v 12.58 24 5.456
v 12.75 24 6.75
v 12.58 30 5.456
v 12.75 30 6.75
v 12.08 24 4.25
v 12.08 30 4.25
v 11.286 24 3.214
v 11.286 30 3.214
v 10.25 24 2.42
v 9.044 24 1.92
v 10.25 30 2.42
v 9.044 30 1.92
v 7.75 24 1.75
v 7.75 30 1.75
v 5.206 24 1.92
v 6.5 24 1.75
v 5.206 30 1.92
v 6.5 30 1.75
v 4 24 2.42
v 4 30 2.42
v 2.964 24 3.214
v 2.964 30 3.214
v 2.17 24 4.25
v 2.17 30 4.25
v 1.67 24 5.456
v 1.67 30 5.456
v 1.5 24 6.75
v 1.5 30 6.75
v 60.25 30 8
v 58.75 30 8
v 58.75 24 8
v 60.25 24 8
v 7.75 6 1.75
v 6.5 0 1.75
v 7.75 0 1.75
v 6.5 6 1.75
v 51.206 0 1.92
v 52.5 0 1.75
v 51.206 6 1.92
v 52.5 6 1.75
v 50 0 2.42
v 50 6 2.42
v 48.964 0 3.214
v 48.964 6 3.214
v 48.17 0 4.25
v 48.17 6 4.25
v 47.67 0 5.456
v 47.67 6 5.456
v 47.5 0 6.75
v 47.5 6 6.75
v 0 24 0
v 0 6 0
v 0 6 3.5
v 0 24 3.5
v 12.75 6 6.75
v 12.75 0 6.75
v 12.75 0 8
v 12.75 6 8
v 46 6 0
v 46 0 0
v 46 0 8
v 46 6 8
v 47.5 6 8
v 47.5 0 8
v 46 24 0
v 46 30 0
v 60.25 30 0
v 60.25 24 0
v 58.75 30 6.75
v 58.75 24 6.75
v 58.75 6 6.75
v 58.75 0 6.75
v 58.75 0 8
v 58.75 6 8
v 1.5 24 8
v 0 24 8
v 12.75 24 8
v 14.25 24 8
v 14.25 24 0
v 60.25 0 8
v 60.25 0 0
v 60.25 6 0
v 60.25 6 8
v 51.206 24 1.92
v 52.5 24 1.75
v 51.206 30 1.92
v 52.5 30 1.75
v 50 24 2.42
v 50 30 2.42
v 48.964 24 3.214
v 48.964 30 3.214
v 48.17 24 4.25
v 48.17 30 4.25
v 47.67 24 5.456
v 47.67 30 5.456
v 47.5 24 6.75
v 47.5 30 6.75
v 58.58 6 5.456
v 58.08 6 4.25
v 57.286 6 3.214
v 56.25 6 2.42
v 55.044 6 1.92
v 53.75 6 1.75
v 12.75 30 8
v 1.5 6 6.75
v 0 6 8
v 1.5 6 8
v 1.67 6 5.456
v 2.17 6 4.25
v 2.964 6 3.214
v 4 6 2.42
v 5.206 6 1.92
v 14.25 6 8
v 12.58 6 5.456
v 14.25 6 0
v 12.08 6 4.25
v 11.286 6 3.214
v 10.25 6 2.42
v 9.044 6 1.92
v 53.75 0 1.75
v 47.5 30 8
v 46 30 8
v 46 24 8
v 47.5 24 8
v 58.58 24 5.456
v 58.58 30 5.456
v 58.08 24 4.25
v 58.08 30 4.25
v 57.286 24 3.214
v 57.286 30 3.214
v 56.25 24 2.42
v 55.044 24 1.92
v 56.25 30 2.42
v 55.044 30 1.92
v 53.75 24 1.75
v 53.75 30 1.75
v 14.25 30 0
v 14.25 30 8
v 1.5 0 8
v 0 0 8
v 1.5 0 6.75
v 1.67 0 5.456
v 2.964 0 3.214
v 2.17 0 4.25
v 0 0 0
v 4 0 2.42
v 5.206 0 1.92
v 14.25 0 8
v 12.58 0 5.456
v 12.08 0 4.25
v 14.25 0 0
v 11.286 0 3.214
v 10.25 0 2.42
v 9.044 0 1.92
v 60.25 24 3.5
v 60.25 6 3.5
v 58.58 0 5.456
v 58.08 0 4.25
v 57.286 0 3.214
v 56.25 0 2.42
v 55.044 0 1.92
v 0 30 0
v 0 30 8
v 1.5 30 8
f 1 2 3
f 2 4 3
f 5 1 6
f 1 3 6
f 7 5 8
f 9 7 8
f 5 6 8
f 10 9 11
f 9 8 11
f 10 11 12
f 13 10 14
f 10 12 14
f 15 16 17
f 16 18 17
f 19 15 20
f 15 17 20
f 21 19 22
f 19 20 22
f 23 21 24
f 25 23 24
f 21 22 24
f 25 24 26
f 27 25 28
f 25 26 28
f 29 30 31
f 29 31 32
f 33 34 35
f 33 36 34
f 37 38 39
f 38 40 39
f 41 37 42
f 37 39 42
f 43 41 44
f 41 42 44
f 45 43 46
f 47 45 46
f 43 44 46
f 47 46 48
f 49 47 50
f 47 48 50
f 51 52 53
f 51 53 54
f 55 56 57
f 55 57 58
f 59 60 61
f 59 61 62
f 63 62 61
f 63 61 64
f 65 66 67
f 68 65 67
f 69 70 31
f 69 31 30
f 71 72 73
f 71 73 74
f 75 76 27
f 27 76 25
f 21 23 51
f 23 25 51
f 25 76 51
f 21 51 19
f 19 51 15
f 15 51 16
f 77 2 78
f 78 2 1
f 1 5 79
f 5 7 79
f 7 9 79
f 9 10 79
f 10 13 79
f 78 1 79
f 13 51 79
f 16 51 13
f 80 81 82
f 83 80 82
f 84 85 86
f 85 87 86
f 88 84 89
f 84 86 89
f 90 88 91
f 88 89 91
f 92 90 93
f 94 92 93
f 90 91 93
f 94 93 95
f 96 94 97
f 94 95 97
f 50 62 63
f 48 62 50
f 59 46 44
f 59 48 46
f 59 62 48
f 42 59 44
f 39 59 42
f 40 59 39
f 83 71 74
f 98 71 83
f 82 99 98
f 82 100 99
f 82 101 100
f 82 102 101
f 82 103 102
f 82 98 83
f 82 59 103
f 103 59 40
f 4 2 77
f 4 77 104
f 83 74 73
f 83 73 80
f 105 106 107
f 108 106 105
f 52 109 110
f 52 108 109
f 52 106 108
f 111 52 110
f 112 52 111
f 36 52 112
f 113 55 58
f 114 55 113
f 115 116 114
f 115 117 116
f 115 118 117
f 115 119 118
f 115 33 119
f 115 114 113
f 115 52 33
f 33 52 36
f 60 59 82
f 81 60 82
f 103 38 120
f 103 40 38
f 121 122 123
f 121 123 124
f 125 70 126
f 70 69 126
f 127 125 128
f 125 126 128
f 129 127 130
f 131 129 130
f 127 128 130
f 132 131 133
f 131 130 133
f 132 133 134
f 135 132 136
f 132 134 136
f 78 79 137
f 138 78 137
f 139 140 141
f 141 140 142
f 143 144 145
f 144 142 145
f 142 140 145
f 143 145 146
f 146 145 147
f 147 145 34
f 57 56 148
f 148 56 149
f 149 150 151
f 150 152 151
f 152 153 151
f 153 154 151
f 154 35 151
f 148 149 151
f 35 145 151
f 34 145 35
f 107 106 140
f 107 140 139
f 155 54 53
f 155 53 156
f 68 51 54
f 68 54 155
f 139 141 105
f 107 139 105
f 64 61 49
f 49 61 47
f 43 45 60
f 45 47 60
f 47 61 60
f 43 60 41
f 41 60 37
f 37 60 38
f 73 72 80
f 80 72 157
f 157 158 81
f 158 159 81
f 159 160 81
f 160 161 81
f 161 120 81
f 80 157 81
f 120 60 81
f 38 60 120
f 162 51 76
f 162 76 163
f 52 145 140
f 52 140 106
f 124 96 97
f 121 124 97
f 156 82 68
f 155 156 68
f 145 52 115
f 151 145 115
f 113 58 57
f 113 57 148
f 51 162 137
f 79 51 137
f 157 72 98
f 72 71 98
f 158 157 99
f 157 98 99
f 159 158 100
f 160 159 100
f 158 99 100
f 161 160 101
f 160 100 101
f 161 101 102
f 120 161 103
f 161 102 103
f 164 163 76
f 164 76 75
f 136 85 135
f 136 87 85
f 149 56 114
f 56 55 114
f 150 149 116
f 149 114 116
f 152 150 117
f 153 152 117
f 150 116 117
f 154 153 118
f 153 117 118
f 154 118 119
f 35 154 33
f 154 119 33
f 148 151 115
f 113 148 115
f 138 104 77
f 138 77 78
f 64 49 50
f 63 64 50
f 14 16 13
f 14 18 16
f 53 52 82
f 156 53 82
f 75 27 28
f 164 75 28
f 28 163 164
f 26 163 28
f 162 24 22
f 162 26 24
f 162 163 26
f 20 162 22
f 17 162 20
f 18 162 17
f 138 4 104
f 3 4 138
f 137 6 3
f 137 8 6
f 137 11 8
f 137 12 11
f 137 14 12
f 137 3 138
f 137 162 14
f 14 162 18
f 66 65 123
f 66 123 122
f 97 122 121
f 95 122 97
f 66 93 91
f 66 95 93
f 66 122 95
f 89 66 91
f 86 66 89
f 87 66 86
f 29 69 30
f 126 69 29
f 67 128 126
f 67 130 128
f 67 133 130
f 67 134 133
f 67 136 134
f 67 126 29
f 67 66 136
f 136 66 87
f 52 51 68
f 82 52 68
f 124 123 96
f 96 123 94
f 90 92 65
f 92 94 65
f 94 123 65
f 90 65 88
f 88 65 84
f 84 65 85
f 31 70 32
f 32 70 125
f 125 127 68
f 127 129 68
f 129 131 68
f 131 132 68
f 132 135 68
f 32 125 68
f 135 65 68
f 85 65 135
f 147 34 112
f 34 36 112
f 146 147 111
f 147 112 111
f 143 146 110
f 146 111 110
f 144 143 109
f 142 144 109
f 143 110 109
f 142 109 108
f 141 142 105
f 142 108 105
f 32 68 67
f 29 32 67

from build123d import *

# Parameters (mm, degrees)
BOX008_W     = 60.25
BOX008_H     = 18
BOX008_DEPTH = 3.5
BOX001_W     = 11.25
BOX001_H     = 6
BOX001_DEPTH = 10
BOX_W        = 14.25
BOX_H        = 6
BOX_DEPTH    = 8
FILLET_R     = 5
BOX010_W     = 11.25
BOX010_H     = 6
BOX010_DEPTH = 10
BOX009_W     = 14.25
BOX009_H     = 6
BOX009_DEPTH = 8
FILLET001_R  = 5
BOX012_W     = 11.25
BOX012_H     = 6
BOX012_DEPTH = 10
BOX011_W     = 14.25
BOX011_H     = 6
BOX011_DEPTH = 8
FILLET003_R  = 5
BOX014_W     = 11.25
BOX014_H     = 6
BOX014_DEPTH = 10
BOX013_W     = 14.25
BOX013_H     = 6
BOX013_DEPTH = 8
FILLET002_R  = 5


with BuildPart() as cube008:
    # Box008 → Box008 (new body)
    with BuildSketch(Plane(origin=(0, 6, 0), x_dir=(1, 0, 0), z_dir=(0, 0, 1))):
        with Locations((30.125, 9)):
            Rectangle(BOX008_W, BOX008_H)
    extrude(amount=BOX008_DEPTH)


with BuildPart() as cube001:
    # Box001 → Box001 (new body)
    with BuildSketch(Plane(origin=(1.5, 0, 1.75), x_dir=(1, 0, 0), z_dir=(0, 0, 1))):
        with Locations((5.625, 3)):
            Rectangle(BOX001_W, BOX001_H)
    extrude(amount=BOX001_DEPTH)


with BuildPart() as fillet_body:
    # Box → Box (new body)
    with BuildSketch(Plane.XY):
        with Locations((7.125, 3)):
            Rectangle(BOX_W, BOX_H)
    extrude(amount=BOX_DEPTH)

    # Cut: cut Cube001
    add(cube001.part, mode=Mode.SUBTRACT)

    # Fillet
    fillet_edges = [fillet_body.edges().sort_by_distance(p)[0] for p in [
        (12.75, 3, 1.75),
        (1.5, 3, 1.75),
    ]]
    fillet(fillet_edges, radius=FILLET_R)


with BuildPart() as cube010:
    # Box010 → Box010 (new body)
    with BuildSketch(Plane(origin=(1.5, 0, 1.75), x_dir=(1, 0, 0), z_dir=(0, 0, 1))):
        with Locations((5.625, 3)):
            Rectangle(BOX010_W, BOX010_H)
    extrude(amount=BOX010_DEPTH)


with BuildPart() as axle01:
    # Box009 → Box009 (new body)
    with BuildSketch(Plane.XY):
        with Locations((7.125, 3)):
            Rectangle(BOX009_W, BOX009_H)
    extrude(amount=BOX009_DEPTH)

    # Cut001: cut Cube010
    add(cube010.part, mode=Mode.SUBTRACT)


with BuildPart() as axle01_1:
    # Cut001 placement: moved
    add(axle01.part.moved(Location((0, 24, 0))))

    # Fillet001
    fillet001_edges = [axle01_1.edges().sort_by_distance(p)[0] for p in [
        (12.75, 27, 1.75),
        (1.5, 27, 1.75),
    ]]
    fillet(fillet001_edges, radius=FILLET001_R)

    # Fusion: union Fillet body
    add(fillet_body.part)


with BuildPart() as cube012:
    # Box012 → Box012 (new body)
    with BuildSketch(Plane(origin=(1.5, 0, 1.75), x_dir=(1, 0, 0), z_dir=(0, 0, 1))):
        with Locations((5.625, 3)):
            Rectangle(BOX012_W, BOX012_H)
    extrude(amount=BOX012_DEPTH)


with BuildPart() as fillet003:
    # Box011 → Box011 (new body)
    with BuildSketch(Plane.XY):
        with Locations((7.125, 3)):
            Rectangle(BOX011_W, BOX011_H)
    extrude(amount=BOX011_DEPTH)

    # Cut003: cut Cube012
    add(cube012.part, mode=Mode.SUBTRACT)

    # Fillet003
    fillet003_edges = [fillet003.edges().sort_by_distance(p)[0] for p in [
        (12.75, 3, 1.75),
        (1.5, 3, 1.75),
    ]]
    fillet(fillet003_edges, radius=FILLET003_R)


with BuildPart() as cube014:
    # Box014 → Box014 (new body)
    with BuildSketch(Plane(origin=(1.5, 0, 1.75), x_dir=(1, 0, 0), z_dir=(0, 0, 1))):
        with Locations((5.625, 3)):
            Rectangle(BOX014_W, BOX014_H)
    extrude(amount=BOX014_DEPTH)


with BuildPart() as axle02:
    # Box013 → Box013 (new body)
    with BuildSketch(Plane.XY):
        with Locations((7.125, 3)):
            Rectangle(BOX013_W, BOX013_H)
    extrude(amount=BOX013_DEPTH)

    # Cut002: cut Cube014
    add(cube014.part, mode=Mode.SUBTRACT)


with BuildPart() as axle02_1:
    # Cut002 placement: moved
    add(axle02.part.moved(Location((0, 24, 0))))

    # Fillet002
    fillet002_edges = [axle02_1.edges().sort_by_distance(p)[0] for p in [
        (12.75, 27, 1.75),
        (1.5, 27, 1.75),
    ]]
    fillet(fillet002_edges, radius=FILLET002_R)

    # Fusion001: union Fillet003
    add(fillet003.part)


with BuildPart() as axle02_2:
    # Fusion001 placement: moved
    add(axle02_1.part.moved(Location((46, 0, 0))))


solid = Compound([cube008.part, axle01_1.part, axle02_2.part])
